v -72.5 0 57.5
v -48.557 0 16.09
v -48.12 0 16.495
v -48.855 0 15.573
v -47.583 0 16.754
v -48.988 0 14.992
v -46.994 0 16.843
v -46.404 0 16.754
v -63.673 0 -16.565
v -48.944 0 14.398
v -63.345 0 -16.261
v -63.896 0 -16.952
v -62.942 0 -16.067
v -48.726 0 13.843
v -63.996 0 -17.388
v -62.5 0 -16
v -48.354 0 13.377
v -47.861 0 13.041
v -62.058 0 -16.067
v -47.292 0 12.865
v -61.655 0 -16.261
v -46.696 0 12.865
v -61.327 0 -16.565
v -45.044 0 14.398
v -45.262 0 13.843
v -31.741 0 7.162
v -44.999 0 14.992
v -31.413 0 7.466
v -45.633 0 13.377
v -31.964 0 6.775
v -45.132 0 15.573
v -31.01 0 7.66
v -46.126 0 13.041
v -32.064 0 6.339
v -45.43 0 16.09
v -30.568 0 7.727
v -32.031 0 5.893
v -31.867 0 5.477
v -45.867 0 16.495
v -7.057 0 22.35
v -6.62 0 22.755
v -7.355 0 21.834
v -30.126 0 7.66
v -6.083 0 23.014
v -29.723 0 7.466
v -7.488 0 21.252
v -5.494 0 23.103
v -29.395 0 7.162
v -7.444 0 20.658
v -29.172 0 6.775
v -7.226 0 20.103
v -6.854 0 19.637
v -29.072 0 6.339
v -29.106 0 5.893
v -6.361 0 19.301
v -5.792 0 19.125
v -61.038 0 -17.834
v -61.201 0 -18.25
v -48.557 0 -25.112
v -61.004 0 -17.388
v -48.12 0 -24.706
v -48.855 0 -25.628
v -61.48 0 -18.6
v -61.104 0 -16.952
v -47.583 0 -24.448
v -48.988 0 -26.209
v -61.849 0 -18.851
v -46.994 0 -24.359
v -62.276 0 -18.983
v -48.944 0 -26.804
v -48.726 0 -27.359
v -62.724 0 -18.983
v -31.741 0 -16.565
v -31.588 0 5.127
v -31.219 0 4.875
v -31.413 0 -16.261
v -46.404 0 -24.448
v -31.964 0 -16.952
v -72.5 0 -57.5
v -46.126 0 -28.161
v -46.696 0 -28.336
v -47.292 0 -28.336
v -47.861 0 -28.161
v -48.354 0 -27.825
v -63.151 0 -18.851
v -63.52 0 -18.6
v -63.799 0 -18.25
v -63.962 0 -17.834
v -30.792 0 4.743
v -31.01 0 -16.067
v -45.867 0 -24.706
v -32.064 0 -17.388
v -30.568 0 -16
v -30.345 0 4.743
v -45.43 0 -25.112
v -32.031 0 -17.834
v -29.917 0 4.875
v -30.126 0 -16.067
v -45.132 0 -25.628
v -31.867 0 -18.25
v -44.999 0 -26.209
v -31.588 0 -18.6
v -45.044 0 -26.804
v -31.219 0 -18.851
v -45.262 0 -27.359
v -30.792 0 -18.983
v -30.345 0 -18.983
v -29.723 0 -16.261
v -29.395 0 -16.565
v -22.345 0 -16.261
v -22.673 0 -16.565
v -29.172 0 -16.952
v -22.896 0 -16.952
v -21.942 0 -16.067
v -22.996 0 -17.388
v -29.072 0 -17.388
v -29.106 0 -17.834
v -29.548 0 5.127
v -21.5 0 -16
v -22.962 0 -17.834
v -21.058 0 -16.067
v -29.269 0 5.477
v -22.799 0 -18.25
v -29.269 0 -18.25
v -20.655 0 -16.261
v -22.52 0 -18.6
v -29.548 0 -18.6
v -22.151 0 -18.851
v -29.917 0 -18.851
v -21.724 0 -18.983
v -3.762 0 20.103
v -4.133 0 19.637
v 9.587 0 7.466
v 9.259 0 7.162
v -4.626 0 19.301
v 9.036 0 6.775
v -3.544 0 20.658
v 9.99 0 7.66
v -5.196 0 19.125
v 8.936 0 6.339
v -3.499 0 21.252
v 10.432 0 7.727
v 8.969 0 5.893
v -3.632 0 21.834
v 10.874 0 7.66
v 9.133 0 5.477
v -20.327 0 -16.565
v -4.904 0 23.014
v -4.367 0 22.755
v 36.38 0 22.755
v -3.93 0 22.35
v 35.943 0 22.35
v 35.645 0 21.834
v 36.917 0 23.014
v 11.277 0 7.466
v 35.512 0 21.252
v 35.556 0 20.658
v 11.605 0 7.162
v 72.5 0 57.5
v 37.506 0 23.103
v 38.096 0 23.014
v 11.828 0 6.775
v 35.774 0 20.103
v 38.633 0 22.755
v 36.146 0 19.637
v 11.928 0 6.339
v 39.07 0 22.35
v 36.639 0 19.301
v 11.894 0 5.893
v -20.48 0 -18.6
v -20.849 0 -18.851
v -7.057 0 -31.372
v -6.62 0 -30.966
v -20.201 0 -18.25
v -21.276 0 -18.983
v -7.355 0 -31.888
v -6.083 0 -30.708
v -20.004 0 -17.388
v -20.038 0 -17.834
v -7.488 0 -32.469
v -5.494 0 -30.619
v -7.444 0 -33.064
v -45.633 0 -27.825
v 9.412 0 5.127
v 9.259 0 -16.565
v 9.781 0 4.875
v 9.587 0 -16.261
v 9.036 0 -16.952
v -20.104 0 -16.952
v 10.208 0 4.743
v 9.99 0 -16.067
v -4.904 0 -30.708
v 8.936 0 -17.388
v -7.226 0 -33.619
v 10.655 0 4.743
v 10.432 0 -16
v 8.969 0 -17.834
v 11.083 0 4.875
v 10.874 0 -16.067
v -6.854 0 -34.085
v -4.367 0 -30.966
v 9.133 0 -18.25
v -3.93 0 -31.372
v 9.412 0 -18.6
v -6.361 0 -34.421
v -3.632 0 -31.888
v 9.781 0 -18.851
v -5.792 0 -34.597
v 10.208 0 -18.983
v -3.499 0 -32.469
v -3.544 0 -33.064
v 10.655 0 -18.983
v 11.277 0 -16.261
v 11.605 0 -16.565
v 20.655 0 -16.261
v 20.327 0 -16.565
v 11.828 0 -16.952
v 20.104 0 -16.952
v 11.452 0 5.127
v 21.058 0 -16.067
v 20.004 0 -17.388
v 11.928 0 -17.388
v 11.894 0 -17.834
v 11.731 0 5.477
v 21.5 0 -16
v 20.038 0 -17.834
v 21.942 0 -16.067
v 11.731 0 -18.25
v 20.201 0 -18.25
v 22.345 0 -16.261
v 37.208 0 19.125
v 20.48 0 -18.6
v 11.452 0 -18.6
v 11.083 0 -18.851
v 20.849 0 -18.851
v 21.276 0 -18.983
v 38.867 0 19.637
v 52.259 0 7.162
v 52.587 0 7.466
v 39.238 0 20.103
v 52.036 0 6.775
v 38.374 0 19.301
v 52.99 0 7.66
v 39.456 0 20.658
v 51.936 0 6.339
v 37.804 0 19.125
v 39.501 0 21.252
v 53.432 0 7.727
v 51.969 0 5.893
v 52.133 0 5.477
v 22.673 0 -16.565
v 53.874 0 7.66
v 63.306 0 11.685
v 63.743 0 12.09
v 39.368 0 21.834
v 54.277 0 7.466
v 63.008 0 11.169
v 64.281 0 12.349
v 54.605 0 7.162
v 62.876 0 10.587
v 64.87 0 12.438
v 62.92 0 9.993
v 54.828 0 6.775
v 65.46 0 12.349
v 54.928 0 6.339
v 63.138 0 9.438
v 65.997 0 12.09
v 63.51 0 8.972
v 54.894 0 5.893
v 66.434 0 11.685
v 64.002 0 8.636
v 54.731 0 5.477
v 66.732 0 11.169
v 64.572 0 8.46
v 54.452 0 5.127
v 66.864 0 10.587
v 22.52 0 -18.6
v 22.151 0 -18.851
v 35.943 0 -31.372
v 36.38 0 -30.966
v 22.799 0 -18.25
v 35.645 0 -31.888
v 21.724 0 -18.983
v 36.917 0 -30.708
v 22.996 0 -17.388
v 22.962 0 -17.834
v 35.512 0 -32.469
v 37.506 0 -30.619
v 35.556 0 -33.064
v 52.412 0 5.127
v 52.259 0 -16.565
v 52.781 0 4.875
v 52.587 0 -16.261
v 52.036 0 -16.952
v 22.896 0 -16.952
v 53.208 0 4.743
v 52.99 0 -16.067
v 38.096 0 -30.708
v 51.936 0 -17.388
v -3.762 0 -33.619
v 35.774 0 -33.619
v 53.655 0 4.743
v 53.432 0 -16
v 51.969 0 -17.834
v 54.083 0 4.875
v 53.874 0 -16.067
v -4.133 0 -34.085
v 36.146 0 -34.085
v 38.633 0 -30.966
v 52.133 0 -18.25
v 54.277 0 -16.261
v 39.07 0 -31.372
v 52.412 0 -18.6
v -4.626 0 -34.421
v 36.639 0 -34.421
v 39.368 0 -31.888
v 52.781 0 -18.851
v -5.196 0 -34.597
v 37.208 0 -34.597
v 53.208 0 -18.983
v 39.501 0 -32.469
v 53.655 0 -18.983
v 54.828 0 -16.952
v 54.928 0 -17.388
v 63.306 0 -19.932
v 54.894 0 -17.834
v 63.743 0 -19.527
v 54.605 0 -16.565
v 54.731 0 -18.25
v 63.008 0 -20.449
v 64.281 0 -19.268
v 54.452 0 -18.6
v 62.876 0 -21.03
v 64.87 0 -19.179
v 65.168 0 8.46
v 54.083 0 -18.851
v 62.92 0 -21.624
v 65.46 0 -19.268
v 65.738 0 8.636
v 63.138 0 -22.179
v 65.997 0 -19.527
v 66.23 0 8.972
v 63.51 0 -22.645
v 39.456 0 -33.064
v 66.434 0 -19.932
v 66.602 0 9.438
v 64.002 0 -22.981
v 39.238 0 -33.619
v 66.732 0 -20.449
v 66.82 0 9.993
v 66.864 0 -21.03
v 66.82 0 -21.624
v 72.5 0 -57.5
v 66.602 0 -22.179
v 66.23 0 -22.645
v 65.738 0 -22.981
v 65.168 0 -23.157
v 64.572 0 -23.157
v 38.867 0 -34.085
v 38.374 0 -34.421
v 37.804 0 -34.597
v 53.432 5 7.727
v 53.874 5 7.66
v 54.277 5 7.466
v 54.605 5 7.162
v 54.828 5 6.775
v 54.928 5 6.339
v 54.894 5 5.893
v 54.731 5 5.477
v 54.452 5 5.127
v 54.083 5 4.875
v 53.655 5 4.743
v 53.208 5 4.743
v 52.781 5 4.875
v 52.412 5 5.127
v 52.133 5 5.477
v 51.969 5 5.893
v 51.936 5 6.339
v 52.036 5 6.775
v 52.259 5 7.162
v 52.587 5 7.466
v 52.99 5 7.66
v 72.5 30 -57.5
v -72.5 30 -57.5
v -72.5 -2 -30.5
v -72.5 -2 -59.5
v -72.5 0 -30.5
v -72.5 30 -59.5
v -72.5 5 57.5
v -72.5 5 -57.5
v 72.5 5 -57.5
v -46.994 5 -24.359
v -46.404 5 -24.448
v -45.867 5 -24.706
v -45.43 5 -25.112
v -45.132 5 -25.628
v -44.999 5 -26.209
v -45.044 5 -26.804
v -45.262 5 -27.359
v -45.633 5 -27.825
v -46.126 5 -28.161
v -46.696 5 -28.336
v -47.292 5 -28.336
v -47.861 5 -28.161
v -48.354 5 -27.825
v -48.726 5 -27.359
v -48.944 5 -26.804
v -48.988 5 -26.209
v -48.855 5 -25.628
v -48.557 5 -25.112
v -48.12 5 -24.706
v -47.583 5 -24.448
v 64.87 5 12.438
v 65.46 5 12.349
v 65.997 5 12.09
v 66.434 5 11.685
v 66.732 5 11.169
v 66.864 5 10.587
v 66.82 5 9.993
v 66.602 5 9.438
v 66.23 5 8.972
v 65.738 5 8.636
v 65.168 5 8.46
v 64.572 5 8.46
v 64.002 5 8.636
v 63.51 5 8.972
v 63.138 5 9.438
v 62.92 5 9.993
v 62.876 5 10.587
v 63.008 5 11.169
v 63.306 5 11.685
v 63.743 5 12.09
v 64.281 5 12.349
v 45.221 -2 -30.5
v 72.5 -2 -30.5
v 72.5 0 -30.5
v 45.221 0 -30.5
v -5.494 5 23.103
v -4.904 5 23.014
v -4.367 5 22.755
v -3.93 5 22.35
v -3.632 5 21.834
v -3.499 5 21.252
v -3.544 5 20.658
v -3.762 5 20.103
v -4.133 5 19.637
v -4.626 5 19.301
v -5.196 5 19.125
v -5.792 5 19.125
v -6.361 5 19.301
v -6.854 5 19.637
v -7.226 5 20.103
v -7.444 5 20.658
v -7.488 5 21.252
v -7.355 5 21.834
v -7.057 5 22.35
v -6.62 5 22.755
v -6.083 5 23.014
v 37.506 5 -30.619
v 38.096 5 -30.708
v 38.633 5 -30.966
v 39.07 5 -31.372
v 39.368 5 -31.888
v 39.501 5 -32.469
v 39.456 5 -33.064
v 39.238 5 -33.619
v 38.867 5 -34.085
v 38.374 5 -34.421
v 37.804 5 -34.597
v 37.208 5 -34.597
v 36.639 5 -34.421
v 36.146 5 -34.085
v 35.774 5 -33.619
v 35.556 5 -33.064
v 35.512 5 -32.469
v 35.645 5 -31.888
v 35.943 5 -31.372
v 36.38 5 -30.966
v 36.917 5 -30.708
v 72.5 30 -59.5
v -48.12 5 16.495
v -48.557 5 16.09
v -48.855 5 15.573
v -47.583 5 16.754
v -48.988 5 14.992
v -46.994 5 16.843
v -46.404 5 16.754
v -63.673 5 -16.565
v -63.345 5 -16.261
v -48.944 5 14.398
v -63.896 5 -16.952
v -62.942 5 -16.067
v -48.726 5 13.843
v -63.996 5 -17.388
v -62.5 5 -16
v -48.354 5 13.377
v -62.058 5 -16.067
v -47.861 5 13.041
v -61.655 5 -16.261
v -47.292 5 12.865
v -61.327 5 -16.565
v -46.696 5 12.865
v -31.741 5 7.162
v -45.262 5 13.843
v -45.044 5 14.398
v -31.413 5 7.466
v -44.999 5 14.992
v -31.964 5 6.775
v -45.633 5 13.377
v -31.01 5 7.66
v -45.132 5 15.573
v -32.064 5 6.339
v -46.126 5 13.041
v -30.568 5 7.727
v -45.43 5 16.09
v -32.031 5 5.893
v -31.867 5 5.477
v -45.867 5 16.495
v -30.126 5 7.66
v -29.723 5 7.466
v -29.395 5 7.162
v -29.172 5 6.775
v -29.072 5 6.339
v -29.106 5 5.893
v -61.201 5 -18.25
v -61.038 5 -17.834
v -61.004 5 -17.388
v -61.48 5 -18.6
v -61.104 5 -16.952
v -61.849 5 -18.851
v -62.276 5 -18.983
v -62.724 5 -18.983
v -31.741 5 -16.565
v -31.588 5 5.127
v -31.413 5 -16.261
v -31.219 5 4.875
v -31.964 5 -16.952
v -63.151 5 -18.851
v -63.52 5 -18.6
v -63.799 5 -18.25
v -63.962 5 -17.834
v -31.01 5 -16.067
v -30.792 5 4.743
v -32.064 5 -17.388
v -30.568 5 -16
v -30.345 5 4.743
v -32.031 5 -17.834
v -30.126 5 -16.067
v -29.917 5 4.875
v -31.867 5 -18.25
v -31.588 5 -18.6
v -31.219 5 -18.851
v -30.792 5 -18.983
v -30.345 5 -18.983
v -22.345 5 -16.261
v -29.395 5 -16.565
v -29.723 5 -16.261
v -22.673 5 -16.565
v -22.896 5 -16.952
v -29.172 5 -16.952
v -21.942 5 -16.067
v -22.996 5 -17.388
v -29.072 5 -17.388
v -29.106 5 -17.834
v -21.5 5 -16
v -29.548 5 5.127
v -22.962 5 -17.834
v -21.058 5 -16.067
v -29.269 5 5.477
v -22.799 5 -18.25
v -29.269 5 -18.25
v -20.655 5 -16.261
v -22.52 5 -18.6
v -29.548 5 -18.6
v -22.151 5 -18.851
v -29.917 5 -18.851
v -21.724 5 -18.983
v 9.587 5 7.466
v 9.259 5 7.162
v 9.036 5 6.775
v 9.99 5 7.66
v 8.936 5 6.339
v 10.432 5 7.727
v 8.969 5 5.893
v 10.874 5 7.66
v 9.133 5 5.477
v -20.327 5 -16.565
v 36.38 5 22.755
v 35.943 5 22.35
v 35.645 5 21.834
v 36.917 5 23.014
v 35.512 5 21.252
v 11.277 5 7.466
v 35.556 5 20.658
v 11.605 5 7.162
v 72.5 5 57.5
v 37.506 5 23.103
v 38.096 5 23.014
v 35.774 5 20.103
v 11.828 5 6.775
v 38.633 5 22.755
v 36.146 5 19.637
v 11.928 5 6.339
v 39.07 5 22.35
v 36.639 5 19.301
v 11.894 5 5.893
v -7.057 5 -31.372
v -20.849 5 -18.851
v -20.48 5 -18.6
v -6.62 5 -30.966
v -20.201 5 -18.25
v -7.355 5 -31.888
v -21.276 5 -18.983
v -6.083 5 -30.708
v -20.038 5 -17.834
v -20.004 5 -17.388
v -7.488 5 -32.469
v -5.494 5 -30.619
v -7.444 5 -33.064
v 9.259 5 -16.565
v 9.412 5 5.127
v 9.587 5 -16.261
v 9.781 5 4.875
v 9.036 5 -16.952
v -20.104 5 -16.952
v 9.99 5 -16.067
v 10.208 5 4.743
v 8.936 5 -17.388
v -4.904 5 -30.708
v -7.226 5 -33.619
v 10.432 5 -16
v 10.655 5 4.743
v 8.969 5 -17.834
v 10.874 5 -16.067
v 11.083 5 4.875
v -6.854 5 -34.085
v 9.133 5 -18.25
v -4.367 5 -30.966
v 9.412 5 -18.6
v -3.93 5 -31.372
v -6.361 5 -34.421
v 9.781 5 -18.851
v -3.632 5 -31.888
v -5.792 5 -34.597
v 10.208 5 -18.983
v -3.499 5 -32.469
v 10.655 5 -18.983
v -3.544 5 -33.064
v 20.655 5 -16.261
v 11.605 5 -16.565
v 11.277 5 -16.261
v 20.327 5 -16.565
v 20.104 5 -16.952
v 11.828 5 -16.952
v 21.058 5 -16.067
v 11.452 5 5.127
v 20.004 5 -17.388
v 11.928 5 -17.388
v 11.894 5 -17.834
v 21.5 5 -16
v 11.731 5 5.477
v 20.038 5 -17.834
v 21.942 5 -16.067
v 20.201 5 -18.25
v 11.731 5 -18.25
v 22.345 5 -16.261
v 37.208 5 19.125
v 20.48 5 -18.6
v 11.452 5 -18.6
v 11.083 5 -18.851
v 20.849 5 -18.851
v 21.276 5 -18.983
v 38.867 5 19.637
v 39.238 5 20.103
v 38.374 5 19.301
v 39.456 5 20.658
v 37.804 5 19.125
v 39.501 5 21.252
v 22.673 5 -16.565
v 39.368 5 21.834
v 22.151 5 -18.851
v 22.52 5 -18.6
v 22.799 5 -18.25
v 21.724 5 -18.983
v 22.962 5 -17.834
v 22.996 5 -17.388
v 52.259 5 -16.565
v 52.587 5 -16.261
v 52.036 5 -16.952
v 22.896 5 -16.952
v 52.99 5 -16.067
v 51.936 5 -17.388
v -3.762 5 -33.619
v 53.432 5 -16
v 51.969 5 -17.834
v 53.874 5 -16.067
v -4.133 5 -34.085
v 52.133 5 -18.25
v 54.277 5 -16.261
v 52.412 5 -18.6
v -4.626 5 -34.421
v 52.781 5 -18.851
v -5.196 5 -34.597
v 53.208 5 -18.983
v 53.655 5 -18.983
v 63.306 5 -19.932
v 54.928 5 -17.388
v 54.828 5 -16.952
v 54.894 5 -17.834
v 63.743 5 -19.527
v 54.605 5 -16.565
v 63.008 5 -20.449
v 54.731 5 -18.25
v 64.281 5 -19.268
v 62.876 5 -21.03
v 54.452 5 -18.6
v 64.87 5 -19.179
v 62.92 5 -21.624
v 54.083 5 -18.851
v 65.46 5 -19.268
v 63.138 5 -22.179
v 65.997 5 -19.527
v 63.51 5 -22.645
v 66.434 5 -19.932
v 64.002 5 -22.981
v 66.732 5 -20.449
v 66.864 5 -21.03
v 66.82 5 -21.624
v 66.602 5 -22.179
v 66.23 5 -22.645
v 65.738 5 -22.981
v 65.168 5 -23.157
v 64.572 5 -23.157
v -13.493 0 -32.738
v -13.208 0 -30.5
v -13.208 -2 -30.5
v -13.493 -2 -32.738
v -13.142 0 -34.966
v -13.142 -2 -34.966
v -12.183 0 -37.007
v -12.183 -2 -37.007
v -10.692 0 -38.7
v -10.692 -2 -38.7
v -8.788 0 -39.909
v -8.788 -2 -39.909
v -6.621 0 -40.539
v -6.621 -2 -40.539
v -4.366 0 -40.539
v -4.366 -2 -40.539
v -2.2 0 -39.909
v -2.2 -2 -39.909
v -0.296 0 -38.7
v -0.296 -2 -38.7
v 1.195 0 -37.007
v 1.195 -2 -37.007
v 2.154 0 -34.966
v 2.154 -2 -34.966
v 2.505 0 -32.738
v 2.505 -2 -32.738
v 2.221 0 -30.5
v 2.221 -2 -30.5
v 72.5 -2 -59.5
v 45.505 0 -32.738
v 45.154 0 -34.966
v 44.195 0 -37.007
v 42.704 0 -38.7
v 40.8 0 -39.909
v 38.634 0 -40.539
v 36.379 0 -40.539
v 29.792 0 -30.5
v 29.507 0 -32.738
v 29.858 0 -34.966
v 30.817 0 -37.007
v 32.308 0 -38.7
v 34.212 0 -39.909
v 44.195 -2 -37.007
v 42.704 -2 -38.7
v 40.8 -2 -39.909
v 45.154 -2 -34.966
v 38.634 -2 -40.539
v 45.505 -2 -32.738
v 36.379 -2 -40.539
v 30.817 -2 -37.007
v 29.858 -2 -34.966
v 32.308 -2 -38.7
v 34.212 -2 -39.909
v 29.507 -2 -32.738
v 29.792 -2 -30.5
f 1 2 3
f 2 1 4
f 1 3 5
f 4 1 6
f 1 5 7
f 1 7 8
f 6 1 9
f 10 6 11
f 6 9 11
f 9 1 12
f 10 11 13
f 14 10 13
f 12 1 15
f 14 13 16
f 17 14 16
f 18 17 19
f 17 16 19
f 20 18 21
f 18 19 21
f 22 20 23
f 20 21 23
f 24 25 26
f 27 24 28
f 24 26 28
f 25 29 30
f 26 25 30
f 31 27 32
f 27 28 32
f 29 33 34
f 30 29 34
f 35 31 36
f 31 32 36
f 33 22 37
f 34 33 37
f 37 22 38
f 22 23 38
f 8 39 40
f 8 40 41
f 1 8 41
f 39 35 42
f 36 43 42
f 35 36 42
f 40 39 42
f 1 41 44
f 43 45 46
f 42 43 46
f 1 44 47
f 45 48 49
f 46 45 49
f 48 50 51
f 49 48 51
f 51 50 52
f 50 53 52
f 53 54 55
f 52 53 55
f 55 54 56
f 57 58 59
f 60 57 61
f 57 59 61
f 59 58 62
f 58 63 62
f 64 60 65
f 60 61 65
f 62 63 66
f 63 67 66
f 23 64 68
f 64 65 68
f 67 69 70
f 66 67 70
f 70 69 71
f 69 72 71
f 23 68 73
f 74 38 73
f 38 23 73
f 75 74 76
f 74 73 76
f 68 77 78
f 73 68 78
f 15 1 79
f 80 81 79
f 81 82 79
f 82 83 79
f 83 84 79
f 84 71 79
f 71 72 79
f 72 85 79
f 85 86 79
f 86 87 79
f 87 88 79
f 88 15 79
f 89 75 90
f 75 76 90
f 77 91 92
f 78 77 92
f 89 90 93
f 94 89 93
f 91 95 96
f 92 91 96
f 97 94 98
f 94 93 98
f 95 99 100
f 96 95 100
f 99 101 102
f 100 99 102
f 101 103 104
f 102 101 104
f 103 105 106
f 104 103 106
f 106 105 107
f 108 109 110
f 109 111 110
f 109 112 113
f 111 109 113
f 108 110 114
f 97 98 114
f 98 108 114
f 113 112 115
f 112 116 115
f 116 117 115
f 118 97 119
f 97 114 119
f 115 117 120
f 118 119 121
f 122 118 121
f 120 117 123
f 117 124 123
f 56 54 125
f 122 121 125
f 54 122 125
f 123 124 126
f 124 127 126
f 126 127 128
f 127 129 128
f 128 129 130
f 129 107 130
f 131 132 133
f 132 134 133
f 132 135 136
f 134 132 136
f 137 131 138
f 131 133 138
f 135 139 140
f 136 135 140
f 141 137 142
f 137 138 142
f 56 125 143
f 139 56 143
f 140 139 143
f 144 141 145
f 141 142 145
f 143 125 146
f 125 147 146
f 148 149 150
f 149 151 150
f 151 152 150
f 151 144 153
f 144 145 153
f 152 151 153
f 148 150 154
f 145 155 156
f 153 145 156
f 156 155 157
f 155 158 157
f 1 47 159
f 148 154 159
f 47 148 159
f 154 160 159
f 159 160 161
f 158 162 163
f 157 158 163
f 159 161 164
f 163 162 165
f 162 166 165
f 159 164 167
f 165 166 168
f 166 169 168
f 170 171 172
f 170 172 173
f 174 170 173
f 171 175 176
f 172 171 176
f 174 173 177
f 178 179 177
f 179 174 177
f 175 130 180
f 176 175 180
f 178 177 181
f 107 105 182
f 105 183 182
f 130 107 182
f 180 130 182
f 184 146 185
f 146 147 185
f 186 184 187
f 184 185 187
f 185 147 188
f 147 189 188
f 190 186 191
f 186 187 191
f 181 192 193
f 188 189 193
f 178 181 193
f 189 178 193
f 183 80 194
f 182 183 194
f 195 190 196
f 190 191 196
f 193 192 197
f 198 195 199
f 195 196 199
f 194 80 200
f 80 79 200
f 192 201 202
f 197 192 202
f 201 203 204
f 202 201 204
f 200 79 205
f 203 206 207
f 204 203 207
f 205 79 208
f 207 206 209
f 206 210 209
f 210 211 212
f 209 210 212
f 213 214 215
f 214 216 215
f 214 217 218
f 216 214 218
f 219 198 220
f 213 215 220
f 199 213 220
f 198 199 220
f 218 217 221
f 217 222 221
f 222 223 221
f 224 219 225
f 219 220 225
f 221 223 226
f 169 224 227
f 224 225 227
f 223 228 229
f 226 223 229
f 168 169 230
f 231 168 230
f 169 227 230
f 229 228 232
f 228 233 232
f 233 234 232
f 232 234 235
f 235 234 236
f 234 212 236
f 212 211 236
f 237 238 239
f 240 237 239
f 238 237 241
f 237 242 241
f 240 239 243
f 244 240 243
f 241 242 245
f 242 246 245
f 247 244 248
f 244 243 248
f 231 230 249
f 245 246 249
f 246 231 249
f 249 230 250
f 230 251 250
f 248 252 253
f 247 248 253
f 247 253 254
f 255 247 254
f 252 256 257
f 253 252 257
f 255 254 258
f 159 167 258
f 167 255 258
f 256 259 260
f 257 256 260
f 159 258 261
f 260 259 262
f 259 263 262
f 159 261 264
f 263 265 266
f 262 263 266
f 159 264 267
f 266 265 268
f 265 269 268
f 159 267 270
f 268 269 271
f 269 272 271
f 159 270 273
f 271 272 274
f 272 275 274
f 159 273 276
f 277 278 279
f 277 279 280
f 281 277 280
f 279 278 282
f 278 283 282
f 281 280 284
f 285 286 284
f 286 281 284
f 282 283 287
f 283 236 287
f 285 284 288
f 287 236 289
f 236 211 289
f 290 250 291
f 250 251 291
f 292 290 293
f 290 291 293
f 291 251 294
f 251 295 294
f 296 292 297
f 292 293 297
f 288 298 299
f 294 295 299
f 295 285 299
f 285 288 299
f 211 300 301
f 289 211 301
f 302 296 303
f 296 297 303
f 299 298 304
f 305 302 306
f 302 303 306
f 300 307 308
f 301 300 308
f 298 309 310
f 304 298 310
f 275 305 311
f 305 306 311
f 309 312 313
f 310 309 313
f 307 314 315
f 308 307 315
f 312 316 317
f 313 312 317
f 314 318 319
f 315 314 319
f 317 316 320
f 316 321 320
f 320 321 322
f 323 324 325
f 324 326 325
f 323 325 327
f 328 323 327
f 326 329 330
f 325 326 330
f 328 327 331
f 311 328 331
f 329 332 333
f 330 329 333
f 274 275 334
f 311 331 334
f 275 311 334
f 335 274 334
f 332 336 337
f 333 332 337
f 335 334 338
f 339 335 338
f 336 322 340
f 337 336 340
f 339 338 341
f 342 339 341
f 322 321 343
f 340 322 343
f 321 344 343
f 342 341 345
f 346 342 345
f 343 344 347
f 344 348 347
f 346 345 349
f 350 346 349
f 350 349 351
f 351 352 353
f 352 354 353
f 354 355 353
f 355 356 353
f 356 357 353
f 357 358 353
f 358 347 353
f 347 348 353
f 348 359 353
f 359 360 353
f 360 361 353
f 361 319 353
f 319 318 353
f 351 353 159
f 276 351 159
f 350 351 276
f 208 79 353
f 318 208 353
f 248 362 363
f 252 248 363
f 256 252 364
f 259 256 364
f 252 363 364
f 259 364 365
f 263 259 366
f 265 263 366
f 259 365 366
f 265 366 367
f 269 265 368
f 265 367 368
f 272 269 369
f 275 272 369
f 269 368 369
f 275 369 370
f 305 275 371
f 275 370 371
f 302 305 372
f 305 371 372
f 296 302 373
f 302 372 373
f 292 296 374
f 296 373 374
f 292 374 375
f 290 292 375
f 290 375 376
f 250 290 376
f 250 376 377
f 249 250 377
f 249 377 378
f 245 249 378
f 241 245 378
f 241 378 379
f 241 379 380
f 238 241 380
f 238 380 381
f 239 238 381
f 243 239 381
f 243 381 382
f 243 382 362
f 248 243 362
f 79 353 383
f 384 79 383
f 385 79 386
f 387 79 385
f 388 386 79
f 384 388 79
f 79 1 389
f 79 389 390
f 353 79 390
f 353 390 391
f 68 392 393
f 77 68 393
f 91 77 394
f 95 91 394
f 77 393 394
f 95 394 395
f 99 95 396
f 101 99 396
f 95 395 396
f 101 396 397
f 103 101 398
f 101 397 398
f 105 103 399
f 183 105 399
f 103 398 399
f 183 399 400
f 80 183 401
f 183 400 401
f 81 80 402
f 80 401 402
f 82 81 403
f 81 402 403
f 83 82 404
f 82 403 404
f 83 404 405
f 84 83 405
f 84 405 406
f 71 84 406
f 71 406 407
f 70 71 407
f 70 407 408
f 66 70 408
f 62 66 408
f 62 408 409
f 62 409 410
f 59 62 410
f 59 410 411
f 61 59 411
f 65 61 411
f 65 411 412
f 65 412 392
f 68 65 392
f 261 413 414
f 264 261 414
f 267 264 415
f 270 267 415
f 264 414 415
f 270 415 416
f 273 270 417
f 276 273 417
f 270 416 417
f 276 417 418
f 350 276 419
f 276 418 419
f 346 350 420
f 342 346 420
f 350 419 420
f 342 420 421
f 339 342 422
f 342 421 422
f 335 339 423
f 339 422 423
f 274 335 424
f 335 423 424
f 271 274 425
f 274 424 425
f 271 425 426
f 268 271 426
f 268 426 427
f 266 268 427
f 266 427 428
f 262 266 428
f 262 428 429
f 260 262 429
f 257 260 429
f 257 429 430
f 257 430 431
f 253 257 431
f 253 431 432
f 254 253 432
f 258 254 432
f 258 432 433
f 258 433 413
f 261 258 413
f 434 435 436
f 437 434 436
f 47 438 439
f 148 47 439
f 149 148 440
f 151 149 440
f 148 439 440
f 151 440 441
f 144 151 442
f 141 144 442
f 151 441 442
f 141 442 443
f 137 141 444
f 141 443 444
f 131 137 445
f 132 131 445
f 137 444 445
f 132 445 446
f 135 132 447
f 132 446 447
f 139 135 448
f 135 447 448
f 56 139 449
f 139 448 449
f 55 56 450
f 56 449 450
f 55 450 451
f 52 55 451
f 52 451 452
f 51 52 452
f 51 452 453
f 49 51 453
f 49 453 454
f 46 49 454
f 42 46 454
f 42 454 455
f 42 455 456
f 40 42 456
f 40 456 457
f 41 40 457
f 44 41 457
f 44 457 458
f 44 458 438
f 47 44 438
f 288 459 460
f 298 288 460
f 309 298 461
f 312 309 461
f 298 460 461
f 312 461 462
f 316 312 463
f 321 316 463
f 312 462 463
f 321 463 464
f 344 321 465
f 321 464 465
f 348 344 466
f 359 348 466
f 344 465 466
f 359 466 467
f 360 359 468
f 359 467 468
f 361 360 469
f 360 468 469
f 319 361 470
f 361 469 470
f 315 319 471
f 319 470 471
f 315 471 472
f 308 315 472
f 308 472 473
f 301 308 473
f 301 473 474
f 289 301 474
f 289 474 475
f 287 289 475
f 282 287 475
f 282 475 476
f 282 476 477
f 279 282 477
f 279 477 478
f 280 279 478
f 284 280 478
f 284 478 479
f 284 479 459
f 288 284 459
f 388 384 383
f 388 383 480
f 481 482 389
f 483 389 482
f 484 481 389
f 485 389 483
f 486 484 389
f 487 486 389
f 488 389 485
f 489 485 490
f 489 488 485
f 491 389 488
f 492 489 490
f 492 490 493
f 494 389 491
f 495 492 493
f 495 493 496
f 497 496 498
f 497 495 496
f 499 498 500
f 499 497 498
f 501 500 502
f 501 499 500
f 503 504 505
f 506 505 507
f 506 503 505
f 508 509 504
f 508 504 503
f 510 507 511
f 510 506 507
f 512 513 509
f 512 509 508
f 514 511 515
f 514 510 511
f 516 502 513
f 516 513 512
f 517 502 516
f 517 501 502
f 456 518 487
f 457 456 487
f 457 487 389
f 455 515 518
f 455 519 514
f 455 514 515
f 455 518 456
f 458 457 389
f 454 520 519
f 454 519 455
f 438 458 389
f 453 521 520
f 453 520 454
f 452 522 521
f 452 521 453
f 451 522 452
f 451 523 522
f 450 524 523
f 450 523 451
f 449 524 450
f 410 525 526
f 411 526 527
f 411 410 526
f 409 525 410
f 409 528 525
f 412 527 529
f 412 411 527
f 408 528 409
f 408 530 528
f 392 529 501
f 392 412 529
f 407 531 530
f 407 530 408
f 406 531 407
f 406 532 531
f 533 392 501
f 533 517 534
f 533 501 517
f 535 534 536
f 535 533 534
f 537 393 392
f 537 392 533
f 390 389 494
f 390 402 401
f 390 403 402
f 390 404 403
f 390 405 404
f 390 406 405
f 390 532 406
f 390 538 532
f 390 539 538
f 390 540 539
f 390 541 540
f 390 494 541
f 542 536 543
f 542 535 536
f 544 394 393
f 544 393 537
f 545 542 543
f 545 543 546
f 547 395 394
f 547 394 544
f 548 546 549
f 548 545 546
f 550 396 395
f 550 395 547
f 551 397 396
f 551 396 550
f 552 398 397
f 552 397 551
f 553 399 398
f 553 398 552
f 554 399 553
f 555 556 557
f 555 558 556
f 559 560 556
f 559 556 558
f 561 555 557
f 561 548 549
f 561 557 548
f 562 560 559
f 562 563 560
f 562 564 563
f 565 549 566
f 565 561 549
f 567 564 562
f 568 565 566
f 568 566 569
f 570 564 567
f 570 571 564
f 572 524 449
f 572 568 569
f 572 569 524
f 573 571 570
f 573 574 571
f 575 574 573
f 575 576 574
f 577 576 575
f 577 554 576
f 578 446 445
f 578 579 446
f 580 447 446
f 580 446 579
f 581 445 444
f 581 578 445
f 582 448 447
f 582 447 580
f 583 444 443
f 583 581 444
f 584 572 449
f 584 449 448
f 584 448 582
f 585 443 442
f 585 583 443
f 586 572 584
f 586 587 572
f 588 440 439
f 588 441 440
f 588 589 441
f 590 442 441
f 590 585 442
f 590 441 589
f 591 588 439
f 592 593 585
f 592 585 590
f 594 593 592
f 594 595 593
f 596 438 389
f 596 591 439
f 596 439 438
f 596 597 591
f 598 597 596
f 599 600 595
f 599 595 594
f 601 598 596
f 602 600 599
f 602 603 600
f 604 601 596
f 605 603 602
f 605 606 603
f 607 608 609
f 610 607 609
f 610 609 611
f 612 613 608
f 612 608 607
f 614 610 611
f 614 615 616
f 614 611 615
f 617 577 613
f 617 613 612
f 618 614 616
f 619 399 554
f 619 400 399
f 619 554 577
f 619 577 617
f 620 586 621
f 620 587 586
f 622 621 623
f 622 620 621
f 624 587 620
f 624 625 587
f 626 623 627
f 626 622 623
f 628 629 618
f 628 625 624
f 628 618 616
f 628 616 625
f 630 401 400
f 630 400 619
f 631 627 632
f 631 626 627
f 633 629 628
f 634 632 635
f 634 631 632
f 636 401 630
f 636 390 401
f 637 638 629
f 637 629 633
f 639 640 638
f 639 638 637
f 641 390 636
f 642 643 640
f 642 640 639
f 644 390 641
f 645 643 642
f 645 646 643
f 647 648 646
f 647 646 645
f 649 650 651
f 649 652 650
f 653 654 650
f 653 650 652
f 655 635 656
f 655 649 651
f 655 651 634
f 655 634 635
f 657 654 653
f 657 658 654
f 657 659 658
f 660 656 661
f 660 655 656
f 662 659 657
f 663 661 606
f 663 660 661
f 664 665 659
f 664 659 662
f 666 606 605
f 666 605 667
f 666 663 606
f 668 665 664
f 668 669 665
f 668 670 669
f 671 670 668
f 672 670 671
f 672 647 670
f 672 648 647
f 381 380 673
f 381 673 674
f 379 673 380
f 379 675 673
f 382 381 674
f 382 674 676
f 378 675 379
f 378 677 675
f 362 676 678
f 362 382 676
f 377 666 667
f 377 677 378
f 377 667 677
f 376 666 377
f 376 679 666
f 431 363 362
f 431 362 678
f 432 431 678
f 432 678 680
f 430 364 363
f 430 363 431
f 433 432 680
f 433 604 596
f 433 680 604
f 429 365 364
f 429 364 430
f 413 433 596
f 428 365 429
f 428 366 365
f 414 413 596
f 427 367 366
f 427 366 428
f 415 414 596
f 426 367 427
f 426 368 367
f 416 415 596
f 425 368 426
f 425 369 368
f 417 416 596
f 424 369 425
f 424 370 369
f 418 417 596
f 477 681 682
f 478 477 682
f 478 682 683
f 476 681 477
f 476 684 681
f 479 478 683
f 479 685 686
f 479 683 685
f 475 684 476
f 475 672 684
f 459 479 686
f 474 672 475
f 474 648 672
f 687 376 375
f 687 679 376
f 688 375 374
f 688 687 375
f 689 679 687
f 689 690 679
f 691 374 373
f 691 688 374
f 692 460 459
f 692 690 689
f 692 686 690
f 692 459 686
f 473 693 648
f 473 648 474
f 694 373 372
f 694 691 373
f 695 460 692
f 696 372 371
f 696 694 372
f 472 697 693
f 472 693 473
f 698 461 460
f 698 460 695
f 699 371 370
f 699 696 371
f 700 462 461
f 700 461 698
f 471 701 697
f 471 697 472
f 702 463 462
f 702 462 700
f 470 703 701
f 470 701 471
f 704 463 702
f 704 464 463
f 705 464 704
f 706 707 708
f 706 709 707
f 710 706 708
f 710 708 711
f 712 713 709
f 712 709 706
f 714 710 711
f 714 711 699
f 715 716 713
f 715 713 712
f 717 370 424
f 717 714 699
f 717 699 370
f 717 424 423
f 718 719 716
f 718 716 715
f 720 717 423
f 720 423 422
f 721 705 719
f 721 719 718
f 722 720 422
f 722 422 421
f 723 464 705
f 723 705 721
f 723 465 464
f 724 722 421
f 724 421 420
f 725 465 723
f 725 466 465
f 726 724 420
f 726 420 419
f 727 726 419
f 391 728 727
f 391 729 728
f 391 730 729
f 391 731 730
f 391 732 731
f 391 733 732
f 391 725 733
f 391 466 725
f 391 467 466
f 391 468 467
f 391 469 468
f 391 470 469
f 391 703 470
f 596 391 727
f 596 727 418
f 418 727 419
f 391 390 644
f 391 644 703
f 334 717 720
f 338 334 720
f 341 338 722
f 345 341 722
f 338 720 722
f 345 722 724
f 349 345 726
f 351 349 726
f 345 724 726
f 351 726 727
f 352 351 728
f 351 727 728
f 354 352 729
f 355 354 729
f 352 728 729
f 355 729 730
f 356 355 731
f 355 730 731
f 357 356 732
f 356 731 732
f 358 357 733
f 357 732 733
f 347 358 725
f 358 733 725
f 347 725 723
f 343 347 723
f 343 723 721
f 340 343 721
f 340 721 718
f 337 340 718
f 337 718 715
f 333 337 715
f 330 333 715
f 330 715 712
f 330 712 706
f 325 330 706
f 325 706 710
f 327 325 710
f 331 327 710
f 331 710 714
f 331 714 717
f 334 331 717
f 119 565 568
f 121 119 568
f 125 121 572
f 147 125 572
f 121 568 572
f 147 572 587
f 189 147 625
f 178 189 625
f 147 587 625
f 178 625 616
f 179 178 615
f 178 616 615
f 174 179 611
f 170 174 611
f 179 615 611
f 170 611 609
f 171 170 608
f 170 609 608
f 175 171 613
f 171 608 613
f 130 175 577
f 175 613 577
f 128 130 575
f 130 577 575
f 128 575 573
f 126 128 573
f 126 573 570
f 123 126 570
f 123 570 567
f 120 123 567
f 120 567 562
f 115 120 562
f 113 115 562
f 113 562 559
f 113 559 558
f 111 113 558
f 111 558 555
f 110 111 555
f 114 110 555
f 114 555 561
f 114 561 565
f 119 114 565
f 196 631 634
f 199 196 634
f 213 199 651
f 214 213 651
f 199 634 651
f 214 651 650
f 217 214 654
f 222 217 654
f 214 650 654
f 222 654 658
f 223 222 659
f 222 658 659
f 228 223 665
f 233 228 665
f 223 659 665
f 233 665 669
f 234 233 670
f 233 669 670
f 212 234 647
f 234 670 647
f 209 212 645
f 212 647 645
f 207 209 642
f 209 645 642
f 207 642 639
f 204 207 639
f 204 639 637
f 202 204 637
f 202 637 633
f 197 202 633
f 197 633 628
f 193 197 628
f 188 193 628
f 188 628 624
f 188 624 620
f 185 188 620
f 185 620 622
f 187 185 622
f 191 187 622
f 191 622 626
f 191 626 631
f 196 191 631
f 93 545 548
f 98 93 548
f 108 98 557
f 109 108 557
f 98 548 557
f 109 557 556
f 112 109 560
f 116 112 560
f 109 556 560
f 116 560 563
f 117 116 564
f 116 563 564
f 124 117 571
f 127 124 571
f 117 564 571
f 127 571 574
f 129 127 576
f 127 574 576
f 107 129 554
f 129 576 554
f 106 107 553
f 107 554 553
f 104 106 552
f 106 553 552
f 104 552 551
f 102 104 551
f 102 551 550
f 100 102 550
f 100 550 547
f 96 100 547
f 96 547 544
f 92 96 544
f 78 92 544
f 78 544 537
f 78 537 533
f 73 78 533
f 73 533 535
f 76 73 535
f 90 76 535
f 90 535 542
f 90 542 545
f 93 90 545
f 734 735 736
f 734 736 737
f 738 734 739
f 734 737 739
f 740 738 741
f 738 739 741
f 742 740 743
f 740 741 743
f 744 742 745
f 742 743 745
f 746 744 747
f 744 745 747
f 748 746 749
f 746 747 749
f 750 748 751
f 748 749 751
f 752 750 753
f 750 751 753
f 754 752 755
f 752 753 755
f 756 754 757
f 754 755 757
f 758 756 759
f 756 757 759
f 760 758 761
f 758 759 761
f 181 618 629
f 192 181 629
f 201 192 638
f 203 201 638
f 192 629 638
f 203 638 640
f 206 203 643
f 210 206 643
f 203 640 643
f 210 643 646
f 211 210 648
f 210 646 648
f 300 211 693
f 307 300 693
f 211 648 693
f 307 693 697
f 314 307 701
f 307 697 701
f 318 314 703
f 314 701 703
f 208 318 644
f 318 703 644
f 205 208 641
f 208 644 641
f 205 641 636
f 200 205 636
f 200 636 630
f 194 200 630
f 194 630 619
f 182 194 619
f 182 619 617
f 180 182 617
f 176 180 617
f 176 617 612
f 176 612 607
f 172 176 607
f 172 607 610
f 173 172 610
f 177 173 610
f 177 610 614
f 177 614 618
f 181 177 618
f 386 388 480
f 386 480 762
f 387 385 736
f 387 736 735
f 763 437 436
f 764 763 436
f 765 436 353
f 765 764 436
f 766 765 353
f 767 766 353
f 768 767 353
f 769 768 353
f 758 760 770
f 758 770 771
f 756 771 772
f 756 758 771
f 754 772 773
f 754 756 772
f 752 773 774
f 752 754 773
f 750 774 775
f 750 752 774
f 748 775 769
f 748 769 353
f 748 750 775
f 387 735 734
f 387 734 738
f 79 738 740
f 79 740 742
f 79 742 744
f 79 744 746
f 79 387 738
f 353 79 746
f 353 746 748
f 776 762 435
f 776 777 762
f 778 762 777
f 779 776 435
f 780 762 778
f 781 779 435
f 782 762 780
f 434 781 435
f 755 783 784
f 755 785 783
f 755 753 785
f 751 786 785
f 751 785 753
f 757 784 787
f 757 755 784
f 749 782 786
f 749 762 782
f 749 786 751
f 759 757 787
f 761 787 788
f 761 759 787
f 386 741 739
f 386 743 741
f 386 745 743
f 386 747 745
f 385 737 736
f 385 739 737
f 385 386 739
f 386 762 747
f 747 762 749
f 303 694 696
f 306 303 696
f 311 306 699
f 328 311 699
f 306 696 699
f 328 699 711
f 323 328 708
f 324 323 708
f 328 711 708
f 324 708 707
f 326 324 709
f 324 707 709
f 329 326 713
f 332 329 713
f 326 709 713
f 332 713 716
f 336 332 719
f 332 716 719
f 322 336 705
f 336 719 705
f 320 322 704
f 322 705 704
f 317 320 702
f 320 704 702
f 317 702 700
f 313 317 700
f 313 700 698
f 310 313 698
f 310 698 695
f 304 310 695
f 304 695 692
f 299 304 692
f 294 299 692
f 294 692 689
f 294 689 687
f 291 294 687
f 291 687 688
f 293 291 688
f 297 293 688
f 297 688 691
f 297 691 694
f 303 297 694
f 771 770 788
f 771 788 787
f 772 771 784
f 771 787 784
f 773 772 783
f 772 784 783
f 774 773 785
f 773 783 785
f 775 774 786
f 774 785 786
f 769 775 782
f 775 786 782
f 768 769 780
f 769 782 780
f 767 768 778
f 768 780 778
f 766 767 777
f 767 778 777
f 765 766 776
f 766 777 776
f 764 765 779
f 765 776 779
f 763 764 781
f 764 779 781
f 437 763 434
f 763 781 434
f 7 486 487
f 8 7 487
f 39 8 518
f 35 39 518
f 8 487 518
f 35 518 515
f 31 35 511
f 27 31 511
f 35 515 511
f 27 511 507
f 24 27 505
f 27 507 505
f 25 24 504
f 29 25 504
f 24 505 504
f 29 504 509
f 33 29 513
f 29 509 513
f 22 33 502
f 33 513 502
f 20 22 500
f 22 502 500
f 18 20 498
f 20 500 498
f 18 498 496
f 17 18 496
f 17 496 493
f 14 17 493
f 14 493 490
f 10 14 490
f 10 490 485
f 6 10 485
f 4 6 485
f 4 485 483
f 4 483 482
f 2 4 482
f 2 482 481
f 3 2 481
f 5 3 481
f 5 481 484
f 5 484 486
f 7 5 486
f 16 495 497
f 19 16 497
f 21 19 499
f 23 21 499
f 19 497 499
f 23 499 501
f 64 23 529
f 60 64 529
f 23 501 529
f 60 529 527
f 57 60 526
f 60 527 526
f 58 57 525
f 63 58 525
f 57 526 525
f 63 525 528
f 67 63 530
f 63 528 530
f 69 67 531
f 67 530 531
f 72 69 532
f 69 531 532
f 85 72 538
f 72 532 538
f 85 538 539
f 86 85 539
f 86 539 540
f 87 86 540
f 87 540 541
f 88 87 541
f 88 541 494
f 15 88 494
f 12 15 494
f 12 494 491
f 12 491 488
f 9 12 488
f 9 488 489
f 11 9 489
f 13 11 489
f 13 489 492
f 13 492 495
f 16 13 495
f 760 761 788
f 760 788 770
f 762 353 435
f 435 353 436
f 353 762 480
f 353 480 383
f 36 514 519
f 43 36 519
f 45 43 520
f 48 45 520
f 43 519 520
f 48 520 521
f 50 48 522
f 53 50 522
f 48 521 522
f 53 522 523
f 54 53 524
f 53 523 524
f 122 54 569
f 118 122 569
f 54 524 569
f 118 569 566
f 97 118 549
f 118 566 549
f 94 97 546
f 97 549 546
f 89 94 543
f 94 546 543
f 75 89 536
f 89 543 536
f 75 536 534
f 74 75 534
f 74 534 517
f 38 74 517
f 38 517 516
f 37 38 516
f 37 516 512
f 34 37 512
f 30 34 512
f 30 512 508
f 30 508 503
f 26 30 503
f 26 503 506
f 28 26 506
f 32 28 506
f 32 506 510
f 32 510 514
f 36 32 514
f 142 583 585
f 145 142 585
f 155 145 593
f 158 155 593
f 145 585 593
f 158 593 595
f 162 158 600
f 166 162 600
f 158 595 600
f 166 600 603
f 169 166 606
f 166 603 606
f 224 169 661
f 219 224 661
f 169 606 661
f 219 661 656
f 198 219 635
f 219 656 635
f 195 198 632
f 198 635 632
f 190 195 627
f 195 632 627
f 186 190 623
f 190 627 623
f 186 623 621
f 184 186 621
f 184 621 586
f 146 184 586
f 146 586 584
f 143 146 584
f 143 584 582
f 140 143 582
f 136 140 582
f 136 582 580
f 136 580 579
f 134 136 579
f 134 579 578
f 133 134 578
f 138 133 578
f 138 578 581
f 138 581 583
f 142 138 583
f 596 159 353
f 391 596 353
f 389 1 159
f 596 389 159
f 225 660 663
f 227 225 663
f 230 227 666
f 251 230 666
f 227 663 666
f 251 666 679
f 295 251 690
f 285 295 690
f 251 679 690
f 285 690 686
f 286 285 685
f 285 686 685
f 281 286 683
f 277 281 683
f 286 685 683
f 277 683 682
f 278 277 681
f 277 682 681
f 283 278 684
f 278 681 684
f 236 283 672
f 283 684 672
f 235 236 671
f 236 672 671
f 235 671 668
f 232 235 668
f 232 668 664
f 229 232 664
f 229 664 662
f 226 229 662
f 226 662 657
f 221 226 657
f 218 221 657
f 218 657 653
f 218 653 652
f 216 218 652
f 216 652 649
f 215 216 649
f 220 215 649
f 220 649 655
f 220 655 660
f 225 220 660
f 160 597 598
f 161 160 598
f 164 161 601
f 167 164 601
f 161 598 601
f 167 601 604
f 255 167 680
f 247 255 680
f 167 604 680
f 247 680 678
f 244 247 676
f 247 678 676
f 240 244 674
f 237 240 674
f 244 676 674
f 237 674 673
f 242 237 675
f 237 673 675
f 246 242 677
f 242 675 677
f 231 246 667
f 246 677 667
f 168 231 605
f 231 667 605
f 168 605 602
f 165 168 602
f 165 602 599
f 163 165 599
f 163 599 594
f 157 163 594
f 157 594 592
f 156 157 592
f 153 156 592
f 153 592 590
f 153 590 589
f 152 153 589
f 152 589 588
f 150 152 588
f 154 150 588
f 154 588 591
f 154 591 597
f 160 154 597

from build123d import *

# Parameters (mm, degrees)
SKETCH1_W           = 145
SKETCH1_H           = 115
BOSS_EXTRUDE1_DEPTH = 5
EXTRUDE_THIN1_DEPTH = 145
SKETCH3_R           = 1.5
SKETCH3_R_2         = 2
CUT_EXTRUDE1_DEPTH  = 98.064411604
SKETCH4_R           = 8
CUT_EXTRUDE2_DEPTH  = 2


with BuildPart() as part:
    # Sketch1 → Boss-Extrude1 (new body)
    with BuildSketch(Plane(origin=(0, 0, 0), x_dir=(1, 0, 0), z_dir=(0, 1, 0))):
        Rectangle(SKETCH1_W, SKETCH1_H)
    extrude(amount=BOSS_EXTRUDE1_DEPTH)

    # Sketch3 → Cut-Extrude1 (cut, through all)
    with BuildSketch(Plane(origin=(0, 5, 0), x_dir=(1, 0, 0), z_dir=(0, 1, 0))):
        with Locations(Location((-62.5, 17.5, 0), (0, 0, 270))):
            Circle(SKETCH3_R)
        with Locations(Location((-30.568159754, 17.5, 0), (0, 0, 270))):
            Circle(SKETCH3_R)
        with Locations(Location((-30.568159754, -6.226569904, 0), (0, 0, 270))):
            Circle(SKETCH3_R)
        with Locations(Location((-21.5, 17.5, 0), (0, 0, 270))):
            Circle(SKETCH3_R)
        with Locations(Location((10.431840246, 17.5, 0), (0, 0, 270))):
            Circle(SKETCH3_R)
        with Locations(Location((10.431840246, -6.226569904, 0), (0, 0, 270))):
            Circle(SKETCH3_R)
        with Locations(Location((21.5, 17.5, 0), (0, 0, 270))):
            Circle(SKETCH3_R)
        with Locations(Location((53.431840246, 17.5, 0), (0, 0, 270))):
            Circle(SKETCH3_R)
        with Locations(Location((53.431840246, -6.226569904, 0), (0, 0, 270))):
            Circle(SKETCH3_R)
        with Locations(Location((64.870084174, 21.179295002, 0), (0, 0, 270))):
            Circle(SKETCH3_R_2)
        with Locations(Location((64.870084174, -10.437925669, 0), (0, 0, 270))):
            Circle(SKETCH3_R_2)
        with Locations(Location((-46.993659826, -14.842716188, 0), (0, 0, 270))):
            Circle(SKETCH3_R_2)
        with Locations(Location((-46.993659826, 26.358666589, 0), (0, 0, 270))):
            Circle(SKETCH3_R_2)
        with Locations(Location((-5.493659826, 32.618936328, 0), (0, 0, 270))):
            Circle(SKETCH3_R_2)
        with Locations(Location((37.506340174, 32.618936328, 0), (0, 0, 270))):
            Circle(SKETCH3_R_2)
        with Locations(Location((-5.493659826, -21.102985926, 0), (0, 0, 270))):
            Circle(SKETCH3_R_2)
        with Locations(Location((37.506340174, -21.102985926, 0), (0, 0, 270))):
            Circle(SKETCH3_R_2)
    extrude(amount=-CUT_EXTRUDE1_DEPTH, mode=Mode.SUBTRACT)


with BuildPart() as body_2:
    # Sketch2 → Extrude-Thin1 (new body)
    with BuildSketch(Plane.ZY.offset(72.5)):
        Polygon((-30.5, 0), (-57.5, 0), (-57.5, 30), (-59.5, 30), (-59.5, -2), (-30.5, -2), align=None)
    extrude(amount=-EXTRUDE_THIN1_DEPTH)

    # Sketch4 → Cut-Extrude2 (cut)
    with BuildSketch(Plane.XZ.offset(2)):
        with Locations((-5.493659826, -32.618936328)):
            Circle(SKETCH4_R)
        with Locations((37.506340174, -32.618936328)):
            Circle(SKETCH4_R)
    extrude(amount=-CUT_EXTRUDE2_DEPTH, mode=Mode.SUBTRACT)


solid = Compound([part.part, body_2.part])
